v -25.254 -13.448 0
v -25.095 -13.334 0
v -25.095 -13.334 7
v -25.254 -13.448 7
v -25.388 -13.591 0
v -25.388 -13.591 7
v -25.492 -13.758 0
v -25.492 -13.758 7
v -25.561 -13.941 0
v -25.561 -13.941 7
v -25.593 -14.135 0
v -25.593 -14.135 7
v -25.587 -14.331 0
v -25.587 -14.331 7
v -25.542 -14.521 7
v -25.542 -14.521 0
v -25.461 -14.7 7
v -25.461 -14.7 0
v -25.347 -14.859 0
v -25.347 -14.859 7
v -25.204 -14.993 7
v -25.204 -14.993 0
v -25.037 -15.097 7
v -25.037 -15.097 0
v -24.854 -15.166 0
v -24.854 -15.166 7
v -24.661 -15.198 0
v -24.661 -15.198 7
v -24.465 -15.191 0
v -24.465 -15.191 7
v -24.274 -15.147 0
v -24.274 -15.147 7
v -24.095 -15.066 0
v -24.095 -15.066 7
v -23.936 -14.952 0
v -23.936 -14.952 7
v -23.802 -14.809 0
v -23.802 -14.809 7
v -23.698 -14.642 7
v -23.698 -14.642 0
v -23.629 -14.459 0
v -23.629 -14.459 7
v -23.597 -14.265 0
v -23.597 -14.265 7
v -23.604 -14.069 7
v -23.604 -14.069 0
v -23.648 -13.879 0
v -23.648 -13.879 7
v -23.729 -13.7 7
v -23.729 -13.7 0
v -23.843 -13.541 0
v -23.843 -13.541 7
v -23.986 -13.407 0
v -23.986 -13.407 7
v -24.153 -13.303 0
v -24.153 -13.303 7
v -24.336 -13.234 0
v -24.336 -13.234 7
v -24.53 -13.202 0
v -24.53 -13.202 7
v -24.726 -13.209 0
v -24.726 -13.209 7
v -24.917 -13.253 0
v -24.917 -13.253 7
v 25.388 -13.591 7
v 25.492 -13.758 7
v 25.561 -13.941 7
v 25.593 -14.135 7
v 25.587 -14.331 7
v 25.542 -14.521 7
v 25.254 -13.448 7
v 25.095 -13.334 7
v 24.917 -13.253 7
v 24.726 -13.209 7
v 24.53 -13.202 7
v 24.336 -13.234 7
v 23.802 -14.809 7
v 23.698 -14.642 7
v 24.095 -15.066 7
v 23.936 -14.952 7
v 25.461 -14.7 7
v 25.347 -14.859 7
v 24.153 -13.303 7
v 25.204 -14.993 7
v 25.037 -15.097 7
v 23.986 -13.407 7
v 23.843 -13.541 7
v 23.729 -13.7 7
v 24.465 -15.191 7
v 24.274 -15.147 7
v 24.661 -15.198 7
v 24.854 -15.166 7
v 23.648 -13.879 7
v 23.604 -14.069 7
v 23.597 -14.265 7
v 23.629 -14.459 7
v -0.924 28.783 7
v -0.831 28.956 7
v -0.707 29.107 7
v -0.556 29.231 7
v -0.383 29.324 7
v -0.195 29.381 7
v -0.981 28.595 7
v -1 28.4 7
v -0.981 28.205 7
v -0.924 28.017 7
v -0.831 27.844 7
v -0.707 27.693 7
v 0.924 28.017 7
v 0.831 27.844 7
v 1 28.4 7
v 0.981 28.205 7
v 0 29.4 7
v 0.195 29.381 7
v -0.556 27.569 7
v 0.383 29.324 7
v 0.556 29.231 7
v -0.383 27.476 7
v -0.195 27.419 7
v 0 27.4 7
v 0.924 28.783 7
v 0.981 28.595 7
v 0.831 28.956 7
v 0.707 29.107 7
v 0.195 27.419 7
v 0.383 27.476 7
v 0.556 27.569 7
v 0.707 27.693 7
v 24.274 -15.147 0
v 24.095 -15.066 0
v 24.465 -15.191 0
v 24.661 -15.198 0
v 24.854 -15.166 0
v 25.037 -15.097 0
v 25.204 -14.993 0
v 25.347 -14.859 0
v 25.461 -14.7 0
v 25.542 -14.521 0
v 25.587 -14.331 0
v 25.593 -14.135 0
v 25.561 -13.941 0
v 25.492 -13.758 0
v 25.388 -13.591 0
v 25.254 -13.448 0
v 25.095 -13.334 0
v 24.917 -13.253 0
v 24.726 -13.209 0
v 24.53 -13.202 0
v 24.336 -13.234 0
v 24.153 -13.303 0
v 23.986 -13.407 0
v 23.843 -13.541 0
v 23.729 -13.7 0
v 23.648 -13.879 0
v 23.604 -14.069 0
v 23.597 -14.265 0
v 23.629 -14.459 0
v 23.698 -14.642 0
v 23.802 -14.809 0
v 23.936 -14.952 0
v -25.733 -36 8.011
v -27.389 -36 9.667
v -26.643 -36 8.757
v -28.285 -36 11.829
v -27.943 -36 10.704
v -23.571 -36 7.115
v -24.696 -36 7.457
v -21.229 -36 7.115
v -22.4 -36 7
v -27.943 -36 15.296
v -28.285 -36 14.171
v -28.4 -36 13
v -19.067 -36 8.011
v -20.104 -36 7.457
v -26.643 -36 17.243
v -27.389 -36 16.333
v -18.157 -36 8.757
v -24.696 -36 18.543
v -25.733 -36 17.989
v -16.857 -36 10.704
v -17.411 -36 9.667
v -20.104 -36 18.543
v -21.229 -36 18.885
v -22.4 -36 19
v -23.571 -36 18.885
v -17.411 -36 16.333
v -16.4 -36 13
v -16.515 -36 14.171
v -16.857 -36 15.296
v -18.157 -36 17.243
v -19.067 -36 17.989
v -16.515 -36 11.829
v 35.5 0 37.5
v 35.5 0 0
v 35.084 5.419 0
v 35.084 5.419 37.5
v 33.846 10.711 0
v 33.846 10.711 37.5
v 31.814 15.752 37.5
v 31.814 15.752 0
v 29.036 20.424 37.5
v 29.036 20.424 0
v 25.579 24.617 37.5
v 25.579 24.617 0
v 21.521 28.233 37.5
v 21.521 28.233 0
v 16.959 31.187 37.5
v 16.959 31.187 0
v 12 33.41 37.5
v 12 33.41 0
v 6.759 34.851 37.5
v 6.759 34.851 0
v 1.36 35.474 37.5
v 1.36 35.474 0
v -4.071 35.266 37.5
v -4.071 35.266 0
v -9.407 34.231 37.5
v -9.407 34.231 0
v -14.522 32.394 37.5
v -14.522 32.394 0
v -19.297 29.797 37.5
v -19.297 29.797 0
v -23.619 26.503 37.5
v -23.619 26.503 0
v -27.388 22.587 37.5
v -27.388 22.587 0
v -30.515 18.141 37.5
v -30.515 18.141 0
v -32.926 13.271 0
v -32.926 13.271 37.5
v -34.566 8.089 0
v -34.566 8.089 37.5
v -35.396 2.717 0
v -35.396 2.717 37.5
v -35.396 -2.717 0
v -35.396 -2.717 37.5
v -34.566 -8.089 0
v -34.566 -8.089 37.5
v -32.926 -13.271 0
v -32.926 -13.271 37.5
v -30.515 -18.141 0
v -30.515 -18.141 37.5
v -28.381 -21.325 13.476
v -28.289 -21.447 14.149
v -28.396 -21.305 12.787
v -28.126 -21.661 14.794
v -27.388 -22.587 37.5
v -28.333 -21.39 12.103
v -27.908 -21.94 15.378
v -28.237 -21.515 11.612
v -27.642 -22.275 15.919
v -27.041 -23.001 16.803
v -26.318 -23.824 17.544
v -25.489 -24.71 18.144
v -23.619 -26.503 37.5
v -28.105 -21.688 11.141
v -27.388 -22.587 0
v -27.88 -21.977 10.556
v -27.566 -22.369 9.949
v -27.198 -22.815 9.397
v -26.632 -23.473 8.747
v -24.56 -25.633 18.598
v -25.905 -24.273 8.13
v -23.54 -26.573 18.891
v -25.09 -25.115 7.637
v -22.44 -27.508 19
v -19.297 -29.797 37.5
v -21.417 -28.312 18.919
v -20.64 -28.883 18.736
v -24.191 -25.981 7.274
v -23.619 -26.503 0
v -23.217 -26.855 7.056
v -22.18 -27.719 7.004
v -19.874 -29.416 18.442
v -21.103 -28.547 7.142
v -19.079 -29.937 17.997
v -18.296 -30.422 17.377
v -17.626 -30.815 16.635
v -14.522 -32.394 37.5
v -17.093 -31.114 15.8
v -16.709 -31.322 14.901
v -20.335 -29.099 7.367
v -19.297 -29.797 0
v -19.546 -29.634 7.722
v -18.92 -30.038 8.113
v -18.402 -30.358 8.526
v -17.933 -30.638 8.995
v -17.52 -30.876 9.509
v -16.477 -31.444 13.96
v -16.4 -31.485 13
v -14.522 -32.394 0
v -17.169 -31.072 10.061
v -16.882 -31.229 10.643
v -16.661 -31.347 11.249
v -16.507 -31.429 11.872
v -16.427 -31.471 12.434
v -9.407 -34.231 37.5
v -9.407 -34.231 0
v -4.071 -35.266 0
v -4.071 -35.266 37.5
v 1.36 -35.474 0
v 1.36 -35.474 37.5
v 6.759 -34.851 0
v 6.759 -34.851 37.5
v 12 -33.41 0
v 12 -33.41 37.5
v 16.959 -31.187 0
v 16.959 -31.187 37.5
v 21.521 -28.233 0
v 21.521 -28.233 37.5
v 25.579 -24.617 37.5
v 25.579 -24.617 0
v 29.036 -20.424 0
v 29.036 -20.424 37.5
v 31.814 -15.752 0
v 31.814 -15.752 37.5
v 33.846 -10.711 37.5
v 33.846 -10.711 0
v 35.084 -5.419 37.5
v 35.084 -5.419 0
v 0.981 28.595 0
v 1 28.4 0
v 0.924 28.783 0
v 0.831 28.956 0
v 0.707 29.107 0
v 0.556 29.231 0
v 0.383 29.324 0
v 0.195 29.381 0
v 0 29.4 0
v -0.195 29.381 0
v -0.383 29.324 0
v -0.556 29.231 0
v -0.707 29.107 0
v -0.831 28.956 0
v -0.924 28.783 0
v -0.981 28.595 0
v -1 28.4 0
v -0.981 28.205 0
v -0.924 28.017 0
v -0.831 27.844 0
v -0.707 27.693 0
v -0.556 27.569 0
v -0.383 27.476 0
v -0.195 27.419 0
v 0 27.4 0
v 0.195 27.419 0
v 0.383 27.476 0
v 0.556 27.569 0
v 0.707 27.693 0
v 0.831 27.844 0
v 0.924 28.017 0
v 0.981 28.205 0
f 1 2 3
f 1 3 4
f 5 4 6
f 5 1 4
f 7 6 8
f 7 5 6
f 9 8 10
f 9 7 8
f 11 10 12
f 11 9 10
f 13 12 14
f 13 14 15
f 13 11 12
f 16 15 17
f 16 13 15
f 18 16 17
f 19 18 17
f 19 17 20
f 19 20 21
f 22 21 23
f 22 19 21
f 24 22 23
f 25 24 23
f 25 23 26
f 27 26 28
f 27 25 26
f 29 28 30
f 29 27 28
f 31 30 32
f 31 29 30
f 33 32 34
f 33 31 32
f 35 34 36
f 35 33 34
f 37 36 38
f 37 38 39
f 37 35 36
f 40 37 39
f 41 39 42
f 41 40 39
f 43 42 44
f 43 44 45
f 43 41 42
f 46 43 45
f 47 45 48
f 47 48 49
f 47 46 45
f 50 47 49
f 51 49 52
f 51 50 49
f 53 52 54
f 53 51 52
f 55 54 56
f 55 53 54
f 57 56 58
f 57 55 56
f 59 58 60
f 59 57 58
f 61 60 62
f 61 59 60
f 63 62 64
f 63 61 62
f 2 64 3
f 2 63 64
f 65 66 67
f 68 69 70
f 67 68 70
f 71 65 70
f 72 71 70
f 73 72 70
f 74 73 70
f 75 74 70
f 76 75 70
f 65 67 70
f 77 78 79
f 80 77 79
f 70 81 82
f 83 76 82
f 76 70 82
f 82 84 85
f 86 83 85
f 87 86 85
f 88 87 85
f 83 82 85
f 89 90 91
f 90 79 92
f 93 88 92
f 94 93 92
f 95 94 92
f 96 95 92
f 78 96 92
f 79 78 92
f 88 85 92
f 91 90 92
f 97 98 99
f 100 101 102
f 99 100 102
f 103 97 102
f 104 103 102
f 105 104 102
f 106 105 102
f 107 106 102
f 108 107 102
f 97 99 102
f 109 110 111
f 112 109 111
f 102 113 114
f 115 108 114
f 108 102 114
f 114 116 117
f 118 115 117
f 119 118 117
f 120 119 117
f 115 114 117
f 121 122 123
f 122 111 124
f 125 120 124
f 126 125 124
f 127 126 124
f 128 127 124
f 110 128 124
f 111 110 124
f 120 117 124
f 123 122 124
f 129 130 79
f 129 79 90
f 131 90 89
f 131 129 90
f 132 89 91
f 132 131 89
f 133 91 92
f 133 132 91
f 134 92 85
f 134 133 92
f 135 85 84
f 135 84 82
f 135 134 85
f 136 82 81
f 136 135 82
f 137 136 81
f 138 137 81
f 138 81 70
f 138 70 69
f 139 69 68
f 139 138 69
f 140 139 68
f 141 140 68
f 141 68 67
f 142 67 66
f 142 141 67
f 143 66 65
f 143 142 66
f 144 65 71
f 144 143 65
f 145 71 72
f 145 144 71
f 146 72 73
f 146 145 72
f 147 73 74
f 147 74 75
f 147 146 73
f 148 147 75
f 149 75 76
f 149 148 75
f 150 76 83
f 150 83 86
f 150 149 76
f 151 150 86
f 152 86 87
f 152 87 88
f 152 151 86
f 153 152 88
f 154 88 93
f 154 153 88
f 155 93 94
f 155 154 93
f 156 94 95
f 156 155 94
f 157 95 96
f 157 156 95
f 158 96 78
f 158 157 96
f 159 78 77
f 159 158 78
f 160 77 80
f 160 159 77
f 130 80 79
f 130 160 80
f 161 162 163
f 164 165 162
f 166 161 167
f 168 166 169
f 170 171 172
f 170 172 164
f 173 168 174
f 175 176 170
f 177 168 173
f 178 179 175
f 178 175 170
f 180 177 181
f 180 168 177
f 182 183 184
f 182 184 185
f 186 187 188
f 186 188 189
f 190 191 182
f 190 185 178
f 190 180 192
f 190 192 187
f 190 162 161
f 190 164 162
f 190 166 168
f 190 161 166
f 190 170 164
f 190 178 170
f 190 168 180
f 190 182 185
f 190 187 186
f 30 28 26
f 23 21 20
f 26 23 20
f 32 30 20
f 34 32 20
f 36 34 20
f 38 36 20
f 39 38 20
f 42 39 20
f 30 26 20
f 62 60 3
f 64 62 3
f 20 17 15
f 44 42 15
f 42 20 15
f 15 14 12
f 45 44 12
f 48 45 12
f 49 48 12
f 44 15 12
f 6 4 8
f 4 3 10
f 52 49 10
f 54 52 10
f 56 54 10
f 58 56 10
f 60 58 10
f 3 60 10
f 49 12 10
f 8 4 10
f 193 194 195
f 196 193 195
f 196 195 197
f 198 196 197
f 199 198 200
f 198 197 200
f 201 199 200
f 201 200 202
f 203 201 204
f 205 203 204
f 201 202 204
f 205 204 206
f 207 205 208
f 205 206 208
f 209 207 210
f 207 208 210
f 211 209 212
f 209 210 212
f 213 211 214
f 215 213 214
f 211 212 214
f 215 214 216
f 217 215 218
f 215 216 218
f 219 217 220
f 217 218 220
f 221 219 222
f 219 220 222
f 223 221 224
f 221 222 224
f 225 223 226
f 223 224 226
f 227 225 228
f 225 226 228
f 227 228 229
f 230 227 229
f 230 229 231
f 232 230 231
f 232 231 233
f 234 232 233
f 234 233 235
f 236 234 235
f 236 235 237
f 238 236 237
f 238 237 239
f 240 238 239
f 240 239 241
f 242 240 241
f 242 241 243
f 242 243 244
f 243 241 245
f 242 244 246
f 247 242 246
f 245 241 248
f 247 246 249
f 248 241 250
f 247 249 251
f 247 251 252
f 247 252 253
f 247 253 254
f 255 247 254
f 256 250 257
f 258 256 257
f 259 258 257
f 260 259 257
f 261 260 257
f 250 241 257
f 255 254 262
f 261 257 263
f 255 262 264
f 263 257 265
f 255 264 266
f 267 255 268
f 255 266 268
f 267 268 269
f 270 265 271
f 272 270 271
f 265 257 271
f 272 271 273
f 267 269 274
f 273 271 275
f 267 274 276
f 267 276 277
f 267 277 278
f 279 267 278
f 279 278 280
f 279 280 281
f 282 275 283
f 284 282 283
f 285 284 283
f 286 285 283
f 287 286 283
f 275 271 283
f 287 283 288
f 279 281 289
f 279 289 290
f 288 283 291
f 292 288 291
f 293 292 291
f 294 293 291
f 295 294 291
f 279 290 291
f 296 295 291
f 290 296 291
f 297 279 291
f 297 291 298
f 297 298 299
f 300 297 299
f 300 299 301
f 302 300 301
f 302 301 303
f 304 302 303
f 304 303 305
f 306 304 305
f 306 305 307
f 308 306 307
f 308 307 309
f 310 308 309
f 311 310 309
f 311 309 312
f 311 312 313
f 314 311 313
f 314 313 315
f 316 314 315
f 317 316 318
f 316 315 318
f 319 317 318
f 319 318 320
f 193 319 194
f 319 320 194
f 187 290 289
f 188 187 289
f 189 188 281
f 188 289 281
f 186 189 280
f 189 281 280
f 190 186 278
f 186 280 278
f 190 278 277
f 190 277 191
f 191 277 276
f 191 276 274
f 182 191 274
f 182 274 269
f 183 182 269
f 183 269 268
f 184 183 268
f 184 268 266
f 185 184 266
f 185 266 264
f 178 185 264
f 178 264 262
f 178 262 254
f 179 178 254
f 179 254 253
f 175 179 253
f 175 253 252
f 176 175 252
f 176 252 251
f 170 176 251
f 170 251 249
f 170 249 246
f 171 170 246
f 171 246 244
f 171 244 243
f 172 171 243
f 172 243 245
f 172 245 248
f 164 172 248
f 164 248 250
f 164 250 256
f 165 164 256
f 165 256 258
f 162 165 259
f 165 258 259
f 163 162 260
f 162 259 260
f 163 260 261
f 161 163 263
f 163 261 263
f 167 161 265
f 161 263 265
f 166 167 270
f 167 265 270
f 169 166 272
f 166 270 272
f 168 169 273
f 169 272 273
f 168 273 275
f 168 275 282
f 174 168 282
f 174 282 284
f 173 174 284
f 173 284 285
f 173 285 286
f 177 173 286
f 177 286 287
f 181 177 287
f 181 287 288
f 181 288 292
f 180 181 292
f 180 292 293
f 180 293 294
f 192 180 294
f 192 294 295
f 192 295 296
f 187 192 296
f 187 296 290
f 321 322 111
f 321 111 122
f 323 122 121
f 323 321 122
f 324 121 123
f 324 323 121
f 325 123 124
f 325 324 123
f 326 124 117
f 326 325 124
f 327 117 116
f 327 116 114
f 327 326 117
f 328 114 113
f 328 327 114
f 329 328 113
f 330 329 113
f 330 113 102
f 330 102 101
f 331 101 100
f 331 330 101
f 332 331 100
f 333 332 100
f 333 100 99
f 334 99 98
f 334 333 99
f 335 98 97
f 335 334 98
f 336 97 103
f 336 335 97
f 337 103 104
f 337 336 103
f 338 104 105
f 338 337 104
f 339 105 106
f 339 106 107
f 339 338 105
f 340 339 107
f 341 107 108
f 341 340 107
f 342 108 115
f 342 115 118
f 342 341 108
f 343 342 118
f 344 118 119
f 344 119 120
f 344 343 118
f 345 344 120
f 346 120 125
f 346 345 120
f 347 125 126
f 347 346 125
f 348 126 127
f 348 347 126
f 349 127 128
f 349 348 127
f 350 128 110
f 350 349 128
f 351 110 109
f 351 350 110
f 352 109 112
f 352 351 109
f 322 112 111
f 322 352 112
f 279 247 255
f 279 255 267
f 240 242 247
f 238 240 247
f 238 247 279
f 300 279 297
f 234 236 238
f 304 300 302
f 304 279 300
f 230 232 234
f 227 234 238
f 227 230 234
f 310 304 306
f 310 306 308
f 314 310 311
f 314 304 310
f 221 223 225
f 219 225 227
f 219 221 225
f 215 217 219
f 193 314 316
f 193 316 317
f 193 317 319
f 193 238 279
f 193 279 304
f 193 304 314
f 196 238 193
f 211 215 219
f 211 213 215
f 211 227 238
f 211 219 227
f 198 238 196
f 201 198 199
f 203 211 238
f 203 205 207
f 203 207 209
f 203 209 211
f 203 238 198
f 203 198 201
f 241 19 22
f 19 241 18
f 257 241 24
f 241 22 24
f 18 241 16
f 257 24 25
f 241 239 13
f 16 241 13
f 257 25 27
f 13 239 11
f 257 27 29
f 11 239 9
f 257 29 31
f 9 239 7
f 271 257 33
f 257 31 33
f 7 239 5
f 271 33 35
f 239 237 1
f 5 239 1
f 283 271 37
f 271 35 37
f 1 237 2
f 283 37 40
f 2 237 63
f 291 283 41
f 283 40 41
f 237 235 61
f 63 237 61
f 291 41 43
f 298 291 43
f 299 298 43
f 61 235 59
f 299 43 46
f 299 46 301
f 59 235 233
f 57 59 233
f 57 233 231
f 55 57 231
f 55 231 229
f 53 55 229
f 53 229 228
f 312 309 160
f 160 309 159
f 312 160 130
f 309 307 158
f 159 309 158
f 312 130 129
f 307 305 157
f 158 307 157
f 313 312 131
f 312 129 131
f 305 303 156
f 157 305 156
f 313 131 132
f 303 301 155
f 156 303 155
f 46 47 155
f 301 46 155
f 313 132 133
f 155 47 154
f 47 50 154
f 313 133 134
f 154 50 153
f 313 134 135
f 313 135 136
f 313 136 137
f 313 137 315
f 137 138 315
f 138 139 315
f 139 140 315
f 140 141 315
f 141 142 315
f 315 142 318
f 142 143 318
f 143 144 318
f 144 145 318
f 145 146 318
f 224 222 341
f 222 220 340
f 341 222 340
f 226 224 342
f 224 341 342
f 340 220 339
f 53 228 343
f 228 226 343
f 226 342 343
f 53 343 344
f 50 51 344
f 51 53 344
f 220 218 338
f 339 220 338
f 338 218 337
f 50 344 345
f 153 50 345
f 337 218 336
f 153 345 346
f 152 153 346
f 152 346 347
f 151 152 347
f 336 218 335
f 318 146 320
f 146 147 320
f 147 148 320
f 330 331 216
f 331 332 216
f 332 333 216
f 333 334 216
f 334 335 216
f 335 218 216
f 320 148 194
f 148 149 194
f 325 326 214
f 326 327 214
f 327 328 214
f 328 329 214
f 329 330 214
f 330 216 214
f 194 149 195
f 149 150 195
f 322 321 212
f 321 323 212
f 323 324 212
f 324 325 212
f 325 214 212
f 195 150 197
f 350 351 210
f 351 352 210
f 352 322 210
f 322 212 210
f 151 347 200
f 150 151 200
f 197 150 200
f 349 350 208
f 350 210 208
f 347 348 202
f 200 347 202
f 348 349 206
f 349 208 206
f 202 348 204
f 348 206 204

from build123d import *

# Parameters (mm, degrees)
SKETCH053_R  = 1
PAD040_DEPTH = 7
ARRAY_COUNT  = 3
SKETCH052_R  = 6
PAD039_DEPTH = 36
SKETCH_R     = 35.5
PAD_DEPTH    = 37.5


with BuildPart() as array:
    # Sketch053 → Pad040 (new body)
    with BuildSketch(Plane.XY):
        with Locations((0, 28.4)):
            Circle(SKETCH053_R)
    extrude(amount=PAD040_DEPTH)

    # Array: Array ×3 about axis
    array_axis = Axis((0, 0, 0), (0, 0, 1))


with BuildPart() as array_1:
    add(array.part)
    for i in range(1, ARRAY_COUNT):
        add(array.part.rotate(array_axis, i * 360 / ARRAY_COUNT))


with BuildPart() as body032:
    # Sketch052 → Pad039 (new body)
    with BuildSketch(Plane.XZ):
        with Locations((-22.4, 13)):
            Circle(SKETCH052_R)
    extrude(amount=PAD039_DEPTH)


with BuildPart() as blower:
    # Sketch → Pad (new body)
    with BuildSketch(Plane.XY):
        Circle(SKETCH_R)
    extrude(amount=PAD_DEPTH)

    # Fusion: union Body032
    add(body032.part)

    # Cut: cut Array
    add(array_1.part, mode=Mode.SUBTRACT)


solid = blower.part
